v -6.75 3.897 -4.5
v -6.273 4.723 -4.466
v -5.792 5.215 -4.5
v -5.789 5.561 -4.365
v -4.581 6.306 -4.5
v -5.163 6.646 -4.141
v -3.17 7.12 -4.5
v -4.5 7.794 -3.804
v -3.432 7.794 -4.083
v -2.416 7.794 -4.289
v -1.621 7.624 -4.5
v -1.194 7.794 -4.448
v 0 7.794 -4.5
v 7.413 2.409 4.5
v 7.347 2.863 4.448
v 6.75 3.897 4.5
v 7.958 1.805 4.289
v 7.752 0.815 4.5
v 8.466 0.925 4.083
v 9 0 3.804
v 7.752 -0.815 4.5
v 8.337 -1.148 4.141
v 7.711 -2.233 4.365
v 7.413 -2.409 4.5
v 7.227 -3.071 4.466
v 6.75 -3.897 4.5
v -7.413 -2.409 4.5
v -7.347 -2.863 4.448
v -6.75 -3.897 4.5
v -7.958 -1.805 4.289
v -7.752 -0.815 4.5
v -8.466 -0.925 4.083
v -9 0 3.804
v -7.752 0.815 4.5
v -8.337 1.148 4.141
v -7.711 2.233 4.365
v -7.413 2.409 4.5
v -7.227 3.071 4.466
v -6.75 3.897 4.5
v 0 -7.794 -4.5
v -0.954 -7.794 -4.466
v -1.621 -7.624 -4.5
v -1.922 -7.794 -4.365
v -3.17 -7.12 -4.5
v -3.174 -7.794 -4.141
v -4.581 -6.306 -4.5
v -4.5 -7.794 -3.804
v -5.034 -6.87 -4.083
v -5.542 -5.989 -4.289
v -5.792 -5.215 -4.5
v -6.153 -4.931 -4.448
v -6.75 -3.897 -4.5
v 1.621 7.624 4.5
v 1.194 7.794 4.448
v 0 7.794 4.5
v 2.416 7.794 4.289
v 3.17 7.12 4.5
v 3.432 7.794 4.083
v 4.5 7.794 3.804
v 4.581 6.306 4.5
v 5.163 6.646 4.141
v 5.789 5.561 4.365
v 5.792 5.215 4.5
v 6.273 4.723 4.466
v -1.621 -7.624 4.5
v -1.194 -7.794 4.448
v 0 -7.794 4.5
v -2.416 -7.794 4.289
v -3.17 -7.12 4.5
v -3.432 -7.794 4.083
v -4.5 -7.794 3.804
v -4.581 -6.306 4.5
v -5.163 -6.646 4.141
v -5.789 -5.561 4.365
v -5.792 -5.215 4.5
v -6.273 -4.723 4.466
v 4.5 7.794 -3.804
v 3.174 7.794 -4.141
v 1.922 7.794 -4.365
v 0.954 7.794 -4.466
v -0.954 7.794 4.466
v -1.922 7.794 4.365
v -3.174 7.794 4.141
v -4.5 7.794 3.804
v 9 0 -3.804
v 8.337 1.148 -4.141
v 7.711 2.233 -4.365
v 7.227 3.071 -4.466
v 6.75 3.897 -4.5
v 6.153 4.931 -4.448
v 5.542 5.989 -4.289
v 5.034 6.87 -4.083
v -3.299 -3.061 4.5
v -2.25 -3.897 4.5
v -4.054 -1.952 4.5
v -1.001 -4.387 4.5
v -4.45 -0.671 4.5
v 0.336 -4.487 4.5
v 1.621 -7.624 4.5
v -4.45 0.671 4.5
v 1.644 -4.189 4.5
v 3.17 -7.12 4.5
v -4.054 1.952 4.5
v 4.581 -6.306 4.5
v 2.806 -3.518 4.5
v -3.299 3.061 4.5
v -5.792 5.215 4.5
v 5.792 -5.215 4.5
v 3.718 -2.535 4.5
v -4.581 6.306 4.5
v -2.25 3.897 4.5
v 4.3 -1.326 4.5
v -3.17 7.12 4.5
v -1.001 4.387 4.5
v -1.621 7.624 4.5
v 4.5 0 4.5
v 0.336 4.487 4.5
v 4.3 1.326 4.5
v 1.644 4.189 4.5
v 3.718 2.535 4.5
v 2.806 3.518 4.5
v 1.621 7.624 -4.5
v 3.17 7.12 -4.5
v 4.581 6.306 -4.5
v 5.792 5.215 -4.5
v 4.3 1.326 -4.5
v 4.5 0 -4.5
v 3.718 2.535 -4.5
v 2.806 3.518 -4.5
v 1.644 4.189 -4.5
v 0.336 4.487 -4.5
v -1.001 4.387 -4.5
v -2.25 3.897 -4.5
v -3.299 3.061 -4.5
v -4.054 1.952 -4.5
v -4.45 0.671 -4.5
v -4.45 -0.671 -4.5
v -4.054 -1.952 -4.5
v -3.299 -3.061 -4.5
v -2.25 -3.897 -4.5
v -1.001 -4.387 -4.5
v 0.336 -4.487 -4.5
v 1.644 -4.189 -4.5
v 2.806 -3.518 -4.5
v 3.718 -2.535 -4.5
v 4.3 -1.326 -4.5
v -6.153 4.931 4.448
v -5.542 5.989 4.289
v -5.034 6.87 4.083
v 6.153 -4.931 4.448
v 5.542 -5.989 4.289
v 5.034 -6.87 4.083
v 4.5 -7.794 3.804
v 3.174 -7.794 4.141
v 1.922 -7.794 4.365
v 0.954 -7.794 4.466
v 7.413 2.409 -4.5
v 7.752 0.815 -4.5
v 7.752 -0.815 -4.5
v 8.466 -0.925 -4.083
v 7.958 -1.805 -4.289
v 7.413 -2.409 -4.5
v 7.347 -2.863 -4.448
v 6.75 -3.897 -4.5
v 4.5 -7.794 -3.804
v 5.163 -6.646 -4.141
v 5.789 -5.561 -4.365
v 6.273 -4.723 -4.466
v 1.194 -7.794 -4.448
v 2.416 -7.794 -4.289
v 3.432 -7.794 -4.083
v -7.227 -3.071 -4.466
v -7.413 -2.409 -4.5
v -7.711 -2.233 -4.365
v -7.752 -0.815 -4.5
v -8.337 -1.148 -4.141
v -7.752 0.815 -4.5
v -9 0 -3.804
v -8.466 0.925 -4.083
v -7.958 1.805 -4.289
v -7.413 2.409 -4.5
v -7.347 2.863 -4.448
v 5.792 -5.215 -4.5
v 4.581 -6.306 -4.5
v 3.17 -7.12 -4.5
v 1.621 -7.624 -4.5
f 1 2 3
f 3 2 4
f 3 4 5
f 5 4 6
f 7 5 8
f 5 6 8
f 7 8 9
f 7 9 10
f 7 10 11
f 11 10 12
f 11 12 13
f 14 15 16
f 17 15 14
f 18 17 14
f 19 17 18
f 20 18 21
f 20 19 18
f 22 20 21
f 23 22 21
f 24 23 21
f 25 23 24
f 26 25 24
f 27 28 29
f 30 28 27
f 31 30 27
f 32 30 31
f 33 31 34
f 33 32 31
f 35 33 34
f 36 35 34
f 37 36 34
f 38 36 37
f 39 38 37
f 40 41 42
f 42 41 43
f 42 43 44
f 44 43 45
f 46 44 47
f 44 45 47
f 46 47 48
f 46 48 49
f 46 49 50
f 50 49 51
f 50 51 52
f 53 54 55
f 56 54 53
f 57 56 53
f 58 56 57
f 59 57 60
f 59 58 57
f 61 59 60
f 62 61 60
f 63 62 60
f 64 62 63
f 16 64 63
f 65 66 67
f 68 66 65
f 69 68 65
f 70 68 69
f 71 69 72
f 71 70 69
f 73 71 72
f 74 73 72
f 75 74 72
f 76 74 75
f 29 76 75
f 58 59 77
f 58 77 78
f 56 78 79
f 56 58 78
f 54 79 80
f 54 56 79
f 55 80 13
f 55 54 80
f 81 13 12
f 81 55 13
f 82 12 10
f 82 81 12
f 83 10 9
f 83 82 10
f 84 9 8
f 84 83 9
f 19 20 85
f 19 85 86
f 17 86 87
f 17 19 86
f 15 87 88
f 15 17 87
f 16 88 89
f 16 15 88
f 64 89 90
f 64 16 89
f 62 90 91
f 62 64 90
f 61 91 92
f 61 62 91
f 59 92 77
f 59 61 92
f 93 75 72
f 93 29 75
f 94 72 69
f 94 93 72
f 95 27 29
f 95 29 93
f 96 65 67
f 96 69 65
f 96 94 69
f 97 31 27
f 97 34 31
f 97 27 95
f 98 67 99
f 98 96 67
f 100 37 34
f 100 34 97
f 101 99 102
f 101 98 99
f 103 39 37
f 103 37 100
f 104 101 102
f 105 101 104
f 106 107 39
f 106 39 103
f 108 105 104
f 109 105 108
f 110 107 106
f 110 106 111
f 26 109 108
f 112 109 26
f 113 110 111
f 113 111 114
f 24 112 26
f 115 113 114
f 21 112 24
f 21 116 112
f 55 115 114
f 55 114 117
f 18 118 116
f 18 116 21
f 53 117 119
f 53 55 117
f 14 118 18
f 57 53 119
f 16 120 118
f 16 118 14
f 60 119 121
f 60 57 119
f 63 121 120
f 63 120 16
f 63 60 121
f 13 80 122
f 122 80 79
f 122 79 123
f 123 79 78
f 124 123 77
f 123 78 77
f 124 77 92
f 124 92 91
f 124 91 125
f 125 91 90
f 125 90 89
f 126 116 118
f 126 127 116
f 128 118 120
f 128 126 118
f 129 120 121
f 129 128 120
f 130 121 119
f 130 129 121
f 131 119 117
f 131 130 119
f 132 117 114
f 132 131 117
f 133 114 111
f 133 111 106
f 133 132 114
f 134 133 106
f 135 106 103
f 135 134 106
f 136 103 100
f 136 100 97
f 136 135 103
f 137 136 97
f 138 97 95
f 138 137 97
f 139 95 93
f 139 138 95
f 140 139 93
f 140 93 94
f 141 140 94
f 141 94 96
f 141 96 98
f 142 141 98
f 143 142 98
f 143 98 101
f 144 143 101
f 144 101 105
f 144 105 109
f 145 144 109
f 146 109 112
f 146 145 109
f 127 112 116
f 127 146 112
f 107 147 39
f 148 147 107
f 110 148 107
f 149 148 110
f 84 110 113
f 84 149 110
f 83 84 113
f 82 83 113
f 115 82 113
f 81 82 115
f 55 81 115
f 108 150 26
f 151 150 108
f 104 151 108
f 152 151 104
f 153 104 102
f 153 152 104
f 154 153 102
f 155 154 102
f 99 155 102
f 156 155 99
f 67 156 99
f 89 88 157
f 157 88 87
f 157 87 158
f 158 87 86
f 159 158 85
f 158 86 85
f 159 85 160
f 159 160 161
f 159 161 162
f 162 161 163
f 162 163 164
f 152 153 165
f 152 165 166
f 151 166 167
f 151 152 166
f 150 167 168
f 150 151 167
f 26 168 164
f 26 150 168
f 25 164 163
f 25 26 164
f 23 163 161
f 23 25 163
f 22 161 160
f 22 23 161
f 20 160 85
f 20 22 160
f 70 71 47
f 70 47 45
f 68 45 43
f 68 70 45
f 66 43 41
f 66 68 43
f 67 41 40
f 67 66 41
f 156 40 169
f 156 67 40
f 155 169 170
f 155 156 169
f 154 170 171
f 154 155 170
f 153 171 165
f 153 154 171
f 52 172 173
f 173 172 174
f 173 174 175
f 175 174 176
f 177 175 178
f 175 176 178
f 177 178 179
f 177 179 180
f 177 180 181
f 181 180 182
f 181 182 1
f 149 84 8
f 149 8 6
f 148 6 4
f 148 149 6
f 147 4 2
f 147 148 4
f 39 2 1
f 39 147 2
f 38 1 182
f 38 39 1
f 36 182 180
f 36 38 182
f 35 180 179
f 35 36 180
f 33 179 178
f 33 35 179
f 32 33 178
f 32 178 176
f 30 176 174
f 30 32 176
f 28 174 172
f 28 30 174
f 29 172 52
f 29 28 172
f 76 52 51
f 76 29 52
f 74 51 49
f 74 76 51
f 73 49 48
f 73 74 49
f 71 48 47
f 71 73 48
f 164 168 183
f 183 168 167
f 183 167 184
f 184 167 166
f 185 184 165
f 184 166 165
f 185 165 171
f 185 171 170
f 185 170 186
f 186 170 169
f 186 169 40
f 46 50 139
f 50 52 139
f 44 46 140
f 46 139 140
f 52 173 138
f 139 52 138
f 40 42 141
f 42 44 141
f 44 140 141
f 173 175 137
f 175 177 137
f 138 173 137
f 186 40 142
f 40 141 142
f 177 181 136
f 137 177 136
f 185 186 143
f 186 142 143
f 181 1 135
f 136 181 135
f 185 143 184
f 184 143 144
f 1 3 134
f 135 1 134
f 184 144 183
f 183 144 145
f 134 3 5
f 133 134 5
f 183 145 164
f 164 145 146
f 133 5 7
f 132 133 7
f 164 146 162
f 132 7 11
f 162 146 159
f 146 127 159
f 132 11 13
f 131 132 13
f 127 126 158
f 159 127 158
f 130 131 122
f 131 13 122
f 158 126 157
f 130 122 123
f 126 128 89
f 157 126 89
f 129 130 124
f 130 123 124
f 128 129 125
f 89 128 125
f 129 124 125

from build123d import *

# Parameters (mm, degrees)
SKETCH4_R           = 4.5
BOSS_EXTRUDE1_DEPTH = 4.5
SKETCH5_OUTSIDE_W   = 56.268
SKETCH5_OUTSIDE_H   = 53.856
SKETCH5_OUTSIDE_R   = 7.794228634
CUT_EXTRUDE1_DEPTH  = 9
CUT_EXTRUDE1_TAPER  = 60


with BuildPart() as part:
    # Sketch4 → Boss-Extrude1 (new body, symmetric)
    with BuildSketch(Plane.XY):
        Polygon((4.5, 7.794228634), (-4.5, 7.794228634), (-9, 0), (-4.5, -7.794228634), (4.5, -7.794228634), (9, 0), align=None)
        Circle(SKETCH4_R, mode=Mode.SUBTRACT)
    extrude(amount=BOSS_EXTRUDE1_DEPTH, both=True)

    # Sketch5 outside → Cut-Extrude1 (cut)
    with BuildSketch(Plane.XY.offset(4.5)):
        Rectangle(SKETCH5_OUTSIDE_W, SKETCH5_OUTSIDE_H)
        Circle(SKETCH5_OUTSIDE_R, mode=Mode.SUBTRACT)
    cut_extrude1 = extrude(amount=-CUT_EXTRUDE1_DEPTH, taper=CUT_EXTRUDE1_TAPER, mode=Mode.SUBTRACT)

    # Mirror1: Cut-Extrude1 across plane
    add(cut_extrude1.mirror(Plane.XY), mode=Mode.SUBTRACT)


solid = part.part
